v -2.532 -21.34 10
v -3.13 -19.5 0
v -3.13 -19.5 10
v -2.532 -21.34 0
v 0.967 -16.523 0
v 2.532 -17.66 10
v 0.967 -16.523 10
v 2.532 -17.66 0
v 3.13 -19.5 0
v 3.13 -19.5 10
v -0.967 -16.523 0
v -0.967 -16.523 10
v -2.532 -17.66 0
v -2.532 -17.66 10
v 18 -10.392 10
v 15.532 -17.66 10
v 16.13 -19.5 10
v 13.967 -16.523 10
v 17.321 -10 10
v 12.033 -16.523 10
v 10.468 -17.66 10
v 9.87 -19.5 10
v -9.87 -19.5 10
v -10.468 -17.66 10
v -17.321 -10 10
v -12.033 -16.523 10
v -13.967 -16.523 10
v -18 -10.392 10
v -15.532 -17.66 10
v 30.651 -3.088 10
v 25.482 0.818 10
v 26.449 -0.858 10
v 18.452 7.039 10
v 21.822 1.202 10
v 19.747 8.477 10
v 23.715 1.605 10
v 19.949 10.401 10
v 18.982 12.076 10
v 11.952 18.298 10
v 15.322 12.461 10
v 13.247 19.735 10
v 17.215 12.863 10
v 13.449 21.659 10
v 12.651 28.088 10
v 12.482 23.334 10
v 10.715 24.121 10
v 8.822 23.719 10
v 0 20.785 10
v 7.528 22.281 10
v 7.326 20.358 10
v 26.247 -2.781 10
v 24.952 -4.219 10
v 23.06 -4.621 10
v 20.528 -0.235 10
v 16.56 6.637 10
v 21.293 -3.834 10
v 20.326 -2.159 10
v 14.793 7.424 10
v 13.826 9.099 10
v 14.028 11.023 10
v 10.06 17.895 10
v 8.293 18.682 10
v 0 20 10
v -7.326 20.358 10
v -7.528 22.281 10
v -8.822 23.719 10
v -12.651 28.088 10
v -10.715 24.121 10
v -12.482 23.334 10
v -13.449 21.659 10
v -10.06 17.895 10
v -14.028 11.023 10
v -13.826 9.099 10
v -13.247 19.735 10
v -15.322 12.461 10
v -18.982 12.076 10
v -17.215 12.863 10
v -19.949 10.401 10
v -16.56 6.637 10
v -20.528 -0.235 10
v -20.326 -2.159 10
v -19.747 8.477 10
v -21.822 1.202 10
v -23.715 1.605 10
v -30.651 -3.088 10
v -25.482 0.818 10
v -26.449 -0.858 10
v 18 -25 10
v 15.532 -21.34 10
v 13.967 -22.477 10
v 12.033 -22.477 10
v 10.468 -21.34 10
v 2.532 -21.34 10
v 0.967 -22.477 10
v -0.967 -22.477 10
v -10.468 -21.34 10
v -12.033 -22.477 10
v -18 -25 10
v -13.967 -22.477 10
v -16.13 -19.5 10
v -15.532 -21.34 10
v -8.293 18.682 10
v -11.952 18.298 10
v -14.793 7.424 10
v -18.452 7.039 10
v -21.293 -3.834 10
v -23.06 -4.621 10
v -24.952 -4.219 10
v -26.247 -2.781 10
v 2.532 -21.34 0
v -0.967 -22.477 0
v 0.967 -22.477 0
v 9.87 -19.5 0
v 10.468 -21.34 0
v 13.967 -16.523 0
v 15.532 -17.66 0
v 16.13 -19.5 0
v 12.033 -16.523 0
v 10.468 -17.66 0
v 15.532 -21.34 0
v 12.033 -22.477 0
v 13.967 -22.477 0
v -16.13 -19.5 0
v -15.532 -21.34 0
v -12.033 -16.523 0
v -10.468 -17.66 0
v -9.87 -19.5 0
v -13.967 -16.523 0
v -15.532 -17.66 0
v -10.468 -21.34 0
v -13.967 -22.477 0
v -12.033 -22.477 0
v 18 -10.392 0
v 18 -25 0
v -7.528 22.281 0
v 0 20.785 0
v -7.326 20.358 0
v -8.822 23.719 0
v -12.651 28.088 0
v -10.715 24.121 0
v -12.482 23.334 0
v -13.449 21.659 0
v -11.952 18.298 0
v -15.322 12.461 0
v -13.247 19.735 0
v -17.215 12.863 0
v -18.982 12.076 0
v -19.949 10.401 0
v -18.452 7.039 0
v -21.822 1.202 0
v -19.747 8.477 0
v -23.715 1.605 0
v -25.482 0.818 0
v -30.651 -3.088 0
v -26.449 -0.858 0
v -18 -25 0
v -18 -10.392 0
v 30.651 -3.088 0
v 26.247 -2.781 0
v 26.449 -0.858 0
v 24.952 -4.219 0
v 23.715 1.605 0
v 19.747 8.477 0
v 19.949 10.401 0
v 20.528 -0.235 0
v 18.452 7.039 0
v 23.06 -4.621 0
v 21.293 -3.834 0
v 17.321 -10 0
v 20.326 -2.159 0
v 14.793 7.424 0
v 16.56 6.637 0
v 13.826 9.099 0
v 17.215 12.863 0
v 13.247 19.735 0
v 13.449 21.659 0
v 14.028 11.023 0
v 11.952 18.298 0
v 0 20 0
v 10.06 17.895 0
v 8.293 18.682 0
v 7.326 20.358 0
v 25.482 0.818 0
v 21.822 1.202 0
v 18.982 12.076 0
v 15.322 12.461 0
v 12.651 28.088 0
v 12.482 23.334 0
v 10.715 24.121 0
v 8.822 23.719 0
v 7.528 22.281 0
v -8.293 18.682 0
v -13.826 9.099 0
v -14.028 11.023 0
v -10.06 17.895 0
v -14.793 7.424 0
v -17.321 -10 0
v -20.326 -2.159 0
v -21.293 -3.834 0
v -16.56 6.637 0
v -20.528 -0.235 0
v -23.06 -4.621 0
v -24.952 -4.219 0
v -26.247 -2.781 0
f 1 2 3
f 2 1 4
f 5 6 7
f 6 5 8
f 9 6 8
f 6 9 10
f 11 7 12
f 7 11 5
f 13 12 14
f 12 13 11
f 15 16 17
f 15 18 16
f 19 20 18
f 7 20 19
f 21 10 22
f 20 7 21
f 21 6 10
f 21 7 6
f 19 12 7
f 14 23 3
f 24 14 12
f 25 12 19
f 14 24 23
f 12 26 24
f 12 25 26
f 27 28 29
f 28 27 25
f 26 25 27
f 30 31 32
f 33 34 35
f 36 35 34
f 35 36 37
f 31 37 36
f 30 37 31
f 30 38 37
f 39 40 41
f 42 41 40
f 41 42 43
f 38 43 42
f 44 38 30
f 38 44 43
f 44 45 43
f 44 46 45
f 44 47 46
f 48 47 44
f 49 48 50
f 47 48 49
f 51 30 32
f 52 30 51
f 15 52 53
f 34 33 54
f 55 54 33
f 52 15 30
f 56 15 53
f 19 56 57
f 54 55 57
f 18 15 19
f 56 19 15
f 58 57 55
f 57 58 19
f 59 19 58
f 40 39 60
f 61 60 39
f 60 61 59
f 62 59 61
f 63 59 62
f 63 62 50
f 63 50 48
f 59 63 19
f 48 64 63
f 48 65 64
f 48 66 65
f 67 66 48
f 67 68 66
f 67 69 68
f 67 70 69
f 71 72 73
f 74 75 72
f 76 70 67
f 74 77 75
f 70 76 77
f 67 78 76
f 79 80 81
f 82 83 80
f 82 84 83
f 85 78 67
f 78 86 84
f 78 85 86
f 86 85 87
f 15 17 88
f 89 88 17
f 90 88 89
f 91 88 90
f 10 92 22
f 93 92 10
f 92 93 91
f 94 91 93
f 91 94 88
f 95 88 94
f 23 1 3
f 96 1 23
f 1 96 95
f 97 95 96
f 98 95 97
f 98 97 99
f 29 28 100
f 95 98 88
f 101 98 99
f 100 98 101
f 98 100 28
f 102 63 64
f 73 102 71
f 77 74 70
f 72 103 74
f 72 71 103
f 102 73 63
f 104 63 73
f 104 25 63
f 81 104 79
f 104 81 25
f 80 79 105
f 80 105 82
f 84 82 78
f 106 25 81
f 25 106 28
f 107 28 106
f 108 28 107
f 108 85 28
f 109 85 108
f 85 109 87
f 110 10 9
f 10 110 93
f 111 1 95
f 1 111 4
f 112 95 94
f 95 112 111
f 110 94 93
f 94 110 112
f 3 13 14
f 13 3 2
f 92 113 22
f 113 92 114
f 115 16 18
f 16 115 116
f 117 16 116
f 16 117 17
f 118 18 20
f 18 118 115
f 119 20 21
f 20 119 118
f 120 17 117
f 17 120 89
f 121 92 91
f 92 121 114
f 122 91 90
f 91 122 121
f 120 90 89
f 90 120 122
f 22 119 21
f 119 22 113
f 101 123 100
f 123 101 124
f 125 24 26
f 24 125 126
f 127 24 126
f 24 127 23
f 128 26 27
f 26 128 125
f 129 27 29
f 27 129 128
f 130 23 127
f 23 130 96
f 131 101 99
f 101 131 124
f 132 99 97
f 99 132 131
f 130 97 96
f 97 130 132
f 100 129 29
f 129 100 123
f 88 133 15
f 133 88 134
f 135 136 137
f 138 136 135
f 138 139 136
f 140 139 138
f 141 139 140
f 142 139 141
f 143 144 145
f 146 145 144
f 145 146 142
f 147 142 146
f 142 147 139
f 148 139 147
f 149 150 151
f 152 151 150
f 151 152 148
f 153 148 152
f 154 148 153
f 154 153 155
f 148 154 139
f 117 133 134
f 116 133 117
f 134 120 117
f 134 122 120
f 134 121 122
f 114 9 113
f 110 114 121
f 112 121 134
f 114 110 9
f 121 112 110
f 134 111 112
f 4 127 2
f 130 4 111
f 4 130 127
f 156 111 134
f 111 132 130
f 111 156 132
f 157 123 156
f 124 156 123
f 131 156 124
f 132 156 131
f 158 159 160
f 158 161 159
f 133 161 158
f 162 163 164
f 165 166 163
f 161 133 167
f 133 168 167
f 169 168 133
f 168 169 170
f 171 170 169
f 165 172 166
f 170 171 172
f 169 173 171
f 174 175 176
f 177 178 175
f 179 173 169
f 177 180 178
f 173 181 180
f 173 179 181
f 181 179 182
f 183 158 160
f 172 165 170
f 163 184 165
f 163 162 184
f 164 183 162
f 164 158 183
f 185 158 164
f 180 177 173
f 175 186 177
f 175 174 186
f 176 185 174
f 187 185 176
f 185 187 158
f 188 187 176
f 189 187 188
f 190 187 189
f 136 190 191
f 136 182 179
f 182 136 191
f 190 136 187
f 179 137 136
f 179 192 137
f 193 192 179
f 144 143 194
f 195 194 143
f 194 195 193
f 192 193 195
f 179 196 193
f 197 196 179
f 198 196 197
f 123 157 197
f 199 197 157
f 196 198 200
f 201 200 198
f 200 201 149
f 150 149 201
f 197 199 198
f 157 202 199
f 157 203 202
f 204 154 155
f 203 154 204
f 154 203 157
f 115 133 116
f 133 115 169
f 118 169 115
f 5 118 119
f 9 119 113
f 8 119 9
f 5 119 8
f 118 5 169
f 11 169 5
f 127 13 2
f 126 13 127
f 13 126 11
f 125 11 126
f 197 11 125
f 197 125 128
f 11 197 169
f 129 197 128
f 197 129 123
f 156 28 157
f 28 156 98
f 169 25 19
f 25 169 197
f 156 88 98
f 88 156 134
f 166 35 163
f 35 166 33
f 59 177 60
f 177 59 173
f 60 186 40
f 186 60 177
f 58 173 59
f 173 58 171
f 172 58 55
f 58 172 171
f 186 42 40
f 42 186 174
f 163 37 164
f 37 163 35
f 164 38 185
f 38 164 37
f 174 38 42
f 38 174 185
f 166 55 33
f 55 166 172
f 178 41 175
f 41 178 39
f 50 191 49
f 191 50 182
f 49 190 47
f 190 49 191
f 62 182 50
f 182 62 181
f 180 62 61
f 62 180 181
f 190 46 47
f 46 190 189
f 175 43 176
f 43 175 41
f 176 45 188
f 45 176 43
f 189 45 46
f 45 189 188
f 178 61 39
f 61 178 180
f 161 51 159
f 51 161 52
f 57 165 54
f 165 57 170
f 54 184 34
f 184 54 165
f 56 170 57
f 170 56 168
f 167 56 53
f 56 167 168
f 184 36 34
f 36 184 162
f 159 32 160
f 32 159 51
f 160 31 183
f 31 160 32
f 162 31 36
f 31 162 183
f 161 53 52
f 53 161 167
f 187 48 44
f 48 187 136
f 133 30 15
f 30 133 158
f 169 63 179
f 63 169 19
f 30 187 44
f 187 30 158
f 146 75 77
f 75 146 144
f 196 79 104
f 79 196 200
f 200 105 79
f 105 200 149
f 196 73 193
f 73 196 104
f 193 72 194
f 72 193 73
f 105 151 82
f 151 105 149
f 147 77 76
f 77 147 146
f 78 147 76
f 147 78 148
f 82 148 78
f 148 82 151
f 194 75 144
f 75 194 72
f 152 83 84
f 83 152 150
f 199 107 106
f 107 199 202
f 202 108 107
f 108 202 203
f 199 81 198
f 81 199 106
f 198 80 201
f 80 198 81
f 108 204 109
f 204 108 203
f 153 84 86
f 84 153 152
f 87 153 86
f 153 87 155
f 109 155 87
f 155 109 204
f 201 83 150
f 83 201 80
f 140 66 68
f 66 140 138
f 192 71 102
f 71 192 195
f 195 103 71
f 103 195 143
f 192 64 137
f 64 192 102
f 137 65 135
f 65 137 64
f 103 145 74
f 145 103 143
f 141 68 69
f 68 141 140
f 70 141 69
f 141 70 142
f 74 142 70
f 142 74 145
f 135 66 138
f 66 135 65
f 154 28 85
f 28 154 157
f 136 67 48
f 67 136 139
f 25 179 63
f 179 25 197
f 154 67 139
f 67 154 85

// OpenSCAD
module holder(){
    translate([0,-9.5,0])difference(){
        translate([0,2,5])cube([36,15,10], center=true);
    union(){
    cylinder(h=20,d=6.26,center=true);
    translate([13,0,0])cylinder(h=20,d=6.26,center=true);
    translate([-13,0,0])cylinder(h=20,d=6.26,center=true);
    }// end union
} // end difference
} // end module

//holder();

module triple(radius){
    union(){
    translate([0,-1*radius,0])holder();
    rotate([0,0,120])translate([0,-1*radius,0])holder();
    rotate([0,0,-120])translate([0,-1*radius,0])holder();
    } // end union
} //end module

triple(10);
